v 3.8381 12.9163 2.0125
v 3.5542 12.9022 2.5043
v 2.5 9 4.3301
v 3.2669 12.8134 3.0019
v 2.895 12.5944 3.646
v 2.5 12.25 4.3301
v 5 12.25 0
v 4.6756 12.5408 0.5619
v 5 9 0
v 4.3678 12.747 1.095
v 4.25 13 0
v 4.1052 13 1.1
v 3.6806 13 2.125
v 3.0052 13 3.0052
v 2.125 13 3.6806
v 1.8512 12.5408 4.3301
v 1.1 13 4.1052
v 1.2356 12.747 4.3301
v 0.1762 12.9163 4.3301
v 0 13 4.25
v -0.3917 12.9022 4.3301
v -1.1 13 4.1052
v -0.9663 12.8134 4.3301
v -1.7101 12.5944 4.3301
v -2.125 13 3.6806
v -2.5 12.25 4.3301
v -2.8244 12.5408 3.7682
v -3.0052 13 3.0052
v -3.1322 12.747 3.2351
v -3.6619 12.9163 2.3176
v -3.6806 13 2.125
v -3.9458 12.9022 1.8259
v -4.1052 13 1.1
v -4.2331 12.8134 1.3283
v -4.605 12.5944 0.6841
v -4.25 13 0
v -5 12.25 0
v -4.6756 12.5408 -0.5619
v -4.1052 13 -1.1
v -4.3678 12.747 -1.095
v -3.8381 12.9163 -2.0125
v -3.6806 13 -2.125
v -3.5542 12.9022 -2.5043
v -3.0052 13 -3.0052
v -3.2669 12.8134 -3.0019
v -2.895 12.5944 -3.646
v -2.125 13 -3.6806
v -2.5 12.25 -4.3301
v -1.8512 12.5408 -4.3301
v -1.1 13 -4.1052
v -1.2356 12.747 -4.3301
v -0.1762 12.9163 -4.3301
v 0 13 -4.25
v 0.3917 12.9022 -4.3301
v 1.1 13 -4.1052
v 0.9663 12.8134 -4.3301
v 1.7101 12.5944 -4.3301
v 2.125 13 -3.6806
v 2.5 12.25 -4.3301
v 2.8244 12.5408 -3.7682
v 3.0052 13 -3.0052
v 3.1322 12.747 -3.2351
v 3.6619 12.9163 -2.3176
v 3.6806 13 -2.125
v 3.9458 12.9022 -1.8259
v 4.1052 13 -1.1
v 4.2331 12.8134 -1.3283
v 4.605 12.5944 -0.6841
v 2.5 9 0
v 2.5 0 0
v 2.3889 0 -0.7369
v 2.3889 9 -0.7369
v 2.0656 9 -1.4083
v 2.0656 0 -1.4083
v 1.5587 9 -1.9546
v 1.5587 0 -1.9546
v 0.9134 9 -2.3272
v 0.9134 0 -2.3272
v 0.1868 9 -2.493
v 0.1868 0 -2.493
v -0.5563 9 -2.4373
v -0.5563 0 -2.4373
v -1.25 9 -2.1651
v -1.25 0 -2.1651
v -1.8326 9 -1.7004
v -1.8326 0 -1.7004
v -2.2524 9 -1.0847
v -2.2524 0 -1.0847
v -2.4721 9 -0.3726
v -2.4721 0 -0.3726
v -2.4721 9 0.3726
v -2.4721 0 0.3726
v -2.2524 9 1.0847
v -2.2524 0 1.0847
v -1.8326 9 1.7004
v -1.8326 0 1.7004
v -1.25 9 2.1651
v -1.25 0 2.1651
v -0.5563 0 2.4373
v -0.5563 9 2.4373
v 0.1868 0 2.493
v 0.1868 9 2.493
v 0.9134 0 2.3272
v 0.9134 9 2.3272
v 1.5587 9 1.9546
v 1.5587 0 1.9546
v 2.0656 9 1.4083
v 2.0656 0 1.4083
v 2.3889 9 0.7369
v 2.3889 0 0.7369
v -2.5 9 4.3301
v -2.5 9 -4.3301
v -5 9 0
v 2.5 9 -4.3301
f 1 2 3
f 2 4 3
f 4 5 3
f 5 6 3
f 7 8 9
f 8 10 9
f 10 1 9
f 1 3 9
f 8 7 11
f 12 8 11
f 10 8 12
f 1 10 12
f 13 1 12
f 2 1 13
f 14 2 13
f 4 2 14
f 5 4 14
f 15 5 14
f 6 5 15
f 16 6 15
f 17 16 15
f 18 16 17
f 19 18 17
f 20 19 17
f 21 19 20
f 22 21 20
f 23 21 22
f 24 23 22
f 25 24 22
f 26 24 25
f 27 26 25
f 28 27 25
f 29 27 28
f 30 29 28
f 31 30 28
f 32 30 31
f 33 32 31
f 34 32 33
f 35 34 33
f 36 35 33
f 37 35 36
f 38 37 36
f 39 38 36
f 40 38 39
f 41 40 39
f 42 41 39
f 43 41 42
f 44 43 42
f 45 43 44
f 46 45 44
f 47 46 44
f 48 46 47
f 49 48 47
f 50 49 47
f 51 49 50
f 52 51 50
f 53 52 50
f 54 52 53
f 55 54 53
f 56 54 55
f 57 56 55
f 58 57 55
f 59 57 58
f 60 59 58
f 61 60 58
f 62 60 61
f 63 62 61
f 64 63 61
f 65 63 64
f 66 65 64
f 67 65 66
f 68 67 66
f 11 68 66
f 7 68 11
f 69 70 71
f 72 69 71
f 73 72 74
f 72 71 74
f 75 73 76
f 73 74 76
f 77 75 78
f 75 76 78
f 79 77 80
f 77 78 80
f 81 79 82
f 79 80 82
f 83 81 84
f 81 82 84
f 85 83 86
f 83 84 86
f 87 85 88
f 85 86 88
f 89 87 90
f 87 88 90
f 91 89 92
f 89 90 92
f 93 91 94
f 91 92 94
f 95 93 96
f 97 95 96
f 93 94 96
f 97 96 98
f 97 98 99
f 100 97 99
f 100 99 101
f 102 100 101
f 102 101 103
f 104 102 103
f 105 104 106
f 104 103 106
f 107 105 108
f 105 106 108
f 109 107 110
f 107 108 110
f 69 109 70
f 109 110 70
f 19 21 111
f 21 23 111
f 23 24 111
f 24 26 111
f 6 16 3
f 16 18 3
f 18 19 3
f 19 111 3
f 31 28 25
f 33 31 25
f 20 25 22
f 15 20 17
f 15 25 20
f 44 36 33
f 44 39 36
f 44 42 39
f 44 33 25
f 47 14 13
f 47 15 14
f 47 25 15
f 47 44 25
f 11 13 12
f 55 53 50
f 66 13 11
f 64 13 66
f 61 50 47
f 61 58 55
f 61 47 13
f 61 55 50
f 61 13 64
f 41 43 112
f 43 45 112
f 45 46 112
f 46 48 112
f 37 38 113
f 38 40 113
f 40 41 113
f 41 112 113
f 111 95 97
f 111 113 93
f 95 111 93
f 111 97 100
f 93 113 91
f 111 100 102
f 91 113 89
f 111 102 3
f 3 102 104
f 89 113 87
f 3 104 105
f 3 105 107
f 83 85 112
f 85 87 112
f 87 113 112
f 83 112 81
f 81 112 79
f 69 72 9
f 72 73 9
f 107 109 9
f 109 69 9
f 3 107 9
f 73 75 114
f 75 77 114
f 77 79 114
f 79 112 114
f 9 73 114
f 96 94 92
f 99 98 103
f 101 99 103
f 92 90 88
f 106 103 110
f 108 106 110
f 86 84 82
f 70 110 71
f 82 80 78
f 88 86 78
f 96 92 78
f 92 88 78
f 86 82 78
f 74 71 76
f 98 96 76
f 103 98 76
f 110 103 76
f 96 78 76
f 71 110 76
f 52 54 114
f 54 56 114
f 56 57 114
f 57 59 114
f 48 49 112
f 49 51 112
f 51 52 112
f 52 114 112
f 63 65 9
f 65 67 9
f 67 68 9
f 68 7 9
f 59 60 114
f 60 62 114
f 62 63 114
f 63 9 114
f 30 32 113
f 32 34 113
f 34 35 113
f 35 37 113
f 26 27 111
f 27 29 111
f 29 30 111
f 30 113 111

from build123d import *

# Parameters (mm, degrees)
SKETCH1_R           = 2.5
BOSS_EXTRUDE1_DEPTH = 9
BOSS_EXTRUDE4_DEPTH = 4
SKETCH5_OUTSIDE_W   = 23.71
SKETCH5_OUTSIDE_H   = 22.37
SKETCH5_OUTSIDE_R   = 4.25
CUT_EXTRUDE1_DEPTH  = 4
CUT_EXTRUDE1_TAPER  = 45


with BuildPart() as part:
    # Sketch1 → Boss-Extrude1 (new body)
    with BuildSketch(Plane(origin=(0, 0, 0), x_dir=(1, 0, 0), z_dir=(0, 1, 0))):
        Circle(SKETCH1_R)
    extrude(amount=BOSS_EXTRUDE1_DEPTH)

    # Sketch3 → Boss-Extrude4 (add)
    with BuildSketch(Plane(origin=(0, 9, 0), x_dir=(1, 0, 0), z_dir=(0, 1, 0))):
        Polygon((5, 0), (2.5, 4.330127019), (-2.5, 4.330127019), (-5, 0), (-2.5, -4.330127019), (2.5, -4.330127019), align=None)
    extrude(amount=BOSS_EXTRUDE4_DEPTH)

    # Sketch5 outside → Cut-Extrude1 (cut)
    with BuildSketch(Plane(origin=(0, 13, 0), x_dir=(1, 0, 0), z_dir=(0, 1, 0))):
        Rectangle(SKETCH5_OUTSIDE_W, SKETCH5_OUTSIDE_H)
        Circle(SKETCH5_OUTSIDE_R, mode=Mode.SUBTRACT)
    extrude(amount=-CUT_EXTRUDE1_DEPTH, taper=CUT_EXTRUDE1_TAPER, mode=Mode.SUBTRACT)


solid = part.part
